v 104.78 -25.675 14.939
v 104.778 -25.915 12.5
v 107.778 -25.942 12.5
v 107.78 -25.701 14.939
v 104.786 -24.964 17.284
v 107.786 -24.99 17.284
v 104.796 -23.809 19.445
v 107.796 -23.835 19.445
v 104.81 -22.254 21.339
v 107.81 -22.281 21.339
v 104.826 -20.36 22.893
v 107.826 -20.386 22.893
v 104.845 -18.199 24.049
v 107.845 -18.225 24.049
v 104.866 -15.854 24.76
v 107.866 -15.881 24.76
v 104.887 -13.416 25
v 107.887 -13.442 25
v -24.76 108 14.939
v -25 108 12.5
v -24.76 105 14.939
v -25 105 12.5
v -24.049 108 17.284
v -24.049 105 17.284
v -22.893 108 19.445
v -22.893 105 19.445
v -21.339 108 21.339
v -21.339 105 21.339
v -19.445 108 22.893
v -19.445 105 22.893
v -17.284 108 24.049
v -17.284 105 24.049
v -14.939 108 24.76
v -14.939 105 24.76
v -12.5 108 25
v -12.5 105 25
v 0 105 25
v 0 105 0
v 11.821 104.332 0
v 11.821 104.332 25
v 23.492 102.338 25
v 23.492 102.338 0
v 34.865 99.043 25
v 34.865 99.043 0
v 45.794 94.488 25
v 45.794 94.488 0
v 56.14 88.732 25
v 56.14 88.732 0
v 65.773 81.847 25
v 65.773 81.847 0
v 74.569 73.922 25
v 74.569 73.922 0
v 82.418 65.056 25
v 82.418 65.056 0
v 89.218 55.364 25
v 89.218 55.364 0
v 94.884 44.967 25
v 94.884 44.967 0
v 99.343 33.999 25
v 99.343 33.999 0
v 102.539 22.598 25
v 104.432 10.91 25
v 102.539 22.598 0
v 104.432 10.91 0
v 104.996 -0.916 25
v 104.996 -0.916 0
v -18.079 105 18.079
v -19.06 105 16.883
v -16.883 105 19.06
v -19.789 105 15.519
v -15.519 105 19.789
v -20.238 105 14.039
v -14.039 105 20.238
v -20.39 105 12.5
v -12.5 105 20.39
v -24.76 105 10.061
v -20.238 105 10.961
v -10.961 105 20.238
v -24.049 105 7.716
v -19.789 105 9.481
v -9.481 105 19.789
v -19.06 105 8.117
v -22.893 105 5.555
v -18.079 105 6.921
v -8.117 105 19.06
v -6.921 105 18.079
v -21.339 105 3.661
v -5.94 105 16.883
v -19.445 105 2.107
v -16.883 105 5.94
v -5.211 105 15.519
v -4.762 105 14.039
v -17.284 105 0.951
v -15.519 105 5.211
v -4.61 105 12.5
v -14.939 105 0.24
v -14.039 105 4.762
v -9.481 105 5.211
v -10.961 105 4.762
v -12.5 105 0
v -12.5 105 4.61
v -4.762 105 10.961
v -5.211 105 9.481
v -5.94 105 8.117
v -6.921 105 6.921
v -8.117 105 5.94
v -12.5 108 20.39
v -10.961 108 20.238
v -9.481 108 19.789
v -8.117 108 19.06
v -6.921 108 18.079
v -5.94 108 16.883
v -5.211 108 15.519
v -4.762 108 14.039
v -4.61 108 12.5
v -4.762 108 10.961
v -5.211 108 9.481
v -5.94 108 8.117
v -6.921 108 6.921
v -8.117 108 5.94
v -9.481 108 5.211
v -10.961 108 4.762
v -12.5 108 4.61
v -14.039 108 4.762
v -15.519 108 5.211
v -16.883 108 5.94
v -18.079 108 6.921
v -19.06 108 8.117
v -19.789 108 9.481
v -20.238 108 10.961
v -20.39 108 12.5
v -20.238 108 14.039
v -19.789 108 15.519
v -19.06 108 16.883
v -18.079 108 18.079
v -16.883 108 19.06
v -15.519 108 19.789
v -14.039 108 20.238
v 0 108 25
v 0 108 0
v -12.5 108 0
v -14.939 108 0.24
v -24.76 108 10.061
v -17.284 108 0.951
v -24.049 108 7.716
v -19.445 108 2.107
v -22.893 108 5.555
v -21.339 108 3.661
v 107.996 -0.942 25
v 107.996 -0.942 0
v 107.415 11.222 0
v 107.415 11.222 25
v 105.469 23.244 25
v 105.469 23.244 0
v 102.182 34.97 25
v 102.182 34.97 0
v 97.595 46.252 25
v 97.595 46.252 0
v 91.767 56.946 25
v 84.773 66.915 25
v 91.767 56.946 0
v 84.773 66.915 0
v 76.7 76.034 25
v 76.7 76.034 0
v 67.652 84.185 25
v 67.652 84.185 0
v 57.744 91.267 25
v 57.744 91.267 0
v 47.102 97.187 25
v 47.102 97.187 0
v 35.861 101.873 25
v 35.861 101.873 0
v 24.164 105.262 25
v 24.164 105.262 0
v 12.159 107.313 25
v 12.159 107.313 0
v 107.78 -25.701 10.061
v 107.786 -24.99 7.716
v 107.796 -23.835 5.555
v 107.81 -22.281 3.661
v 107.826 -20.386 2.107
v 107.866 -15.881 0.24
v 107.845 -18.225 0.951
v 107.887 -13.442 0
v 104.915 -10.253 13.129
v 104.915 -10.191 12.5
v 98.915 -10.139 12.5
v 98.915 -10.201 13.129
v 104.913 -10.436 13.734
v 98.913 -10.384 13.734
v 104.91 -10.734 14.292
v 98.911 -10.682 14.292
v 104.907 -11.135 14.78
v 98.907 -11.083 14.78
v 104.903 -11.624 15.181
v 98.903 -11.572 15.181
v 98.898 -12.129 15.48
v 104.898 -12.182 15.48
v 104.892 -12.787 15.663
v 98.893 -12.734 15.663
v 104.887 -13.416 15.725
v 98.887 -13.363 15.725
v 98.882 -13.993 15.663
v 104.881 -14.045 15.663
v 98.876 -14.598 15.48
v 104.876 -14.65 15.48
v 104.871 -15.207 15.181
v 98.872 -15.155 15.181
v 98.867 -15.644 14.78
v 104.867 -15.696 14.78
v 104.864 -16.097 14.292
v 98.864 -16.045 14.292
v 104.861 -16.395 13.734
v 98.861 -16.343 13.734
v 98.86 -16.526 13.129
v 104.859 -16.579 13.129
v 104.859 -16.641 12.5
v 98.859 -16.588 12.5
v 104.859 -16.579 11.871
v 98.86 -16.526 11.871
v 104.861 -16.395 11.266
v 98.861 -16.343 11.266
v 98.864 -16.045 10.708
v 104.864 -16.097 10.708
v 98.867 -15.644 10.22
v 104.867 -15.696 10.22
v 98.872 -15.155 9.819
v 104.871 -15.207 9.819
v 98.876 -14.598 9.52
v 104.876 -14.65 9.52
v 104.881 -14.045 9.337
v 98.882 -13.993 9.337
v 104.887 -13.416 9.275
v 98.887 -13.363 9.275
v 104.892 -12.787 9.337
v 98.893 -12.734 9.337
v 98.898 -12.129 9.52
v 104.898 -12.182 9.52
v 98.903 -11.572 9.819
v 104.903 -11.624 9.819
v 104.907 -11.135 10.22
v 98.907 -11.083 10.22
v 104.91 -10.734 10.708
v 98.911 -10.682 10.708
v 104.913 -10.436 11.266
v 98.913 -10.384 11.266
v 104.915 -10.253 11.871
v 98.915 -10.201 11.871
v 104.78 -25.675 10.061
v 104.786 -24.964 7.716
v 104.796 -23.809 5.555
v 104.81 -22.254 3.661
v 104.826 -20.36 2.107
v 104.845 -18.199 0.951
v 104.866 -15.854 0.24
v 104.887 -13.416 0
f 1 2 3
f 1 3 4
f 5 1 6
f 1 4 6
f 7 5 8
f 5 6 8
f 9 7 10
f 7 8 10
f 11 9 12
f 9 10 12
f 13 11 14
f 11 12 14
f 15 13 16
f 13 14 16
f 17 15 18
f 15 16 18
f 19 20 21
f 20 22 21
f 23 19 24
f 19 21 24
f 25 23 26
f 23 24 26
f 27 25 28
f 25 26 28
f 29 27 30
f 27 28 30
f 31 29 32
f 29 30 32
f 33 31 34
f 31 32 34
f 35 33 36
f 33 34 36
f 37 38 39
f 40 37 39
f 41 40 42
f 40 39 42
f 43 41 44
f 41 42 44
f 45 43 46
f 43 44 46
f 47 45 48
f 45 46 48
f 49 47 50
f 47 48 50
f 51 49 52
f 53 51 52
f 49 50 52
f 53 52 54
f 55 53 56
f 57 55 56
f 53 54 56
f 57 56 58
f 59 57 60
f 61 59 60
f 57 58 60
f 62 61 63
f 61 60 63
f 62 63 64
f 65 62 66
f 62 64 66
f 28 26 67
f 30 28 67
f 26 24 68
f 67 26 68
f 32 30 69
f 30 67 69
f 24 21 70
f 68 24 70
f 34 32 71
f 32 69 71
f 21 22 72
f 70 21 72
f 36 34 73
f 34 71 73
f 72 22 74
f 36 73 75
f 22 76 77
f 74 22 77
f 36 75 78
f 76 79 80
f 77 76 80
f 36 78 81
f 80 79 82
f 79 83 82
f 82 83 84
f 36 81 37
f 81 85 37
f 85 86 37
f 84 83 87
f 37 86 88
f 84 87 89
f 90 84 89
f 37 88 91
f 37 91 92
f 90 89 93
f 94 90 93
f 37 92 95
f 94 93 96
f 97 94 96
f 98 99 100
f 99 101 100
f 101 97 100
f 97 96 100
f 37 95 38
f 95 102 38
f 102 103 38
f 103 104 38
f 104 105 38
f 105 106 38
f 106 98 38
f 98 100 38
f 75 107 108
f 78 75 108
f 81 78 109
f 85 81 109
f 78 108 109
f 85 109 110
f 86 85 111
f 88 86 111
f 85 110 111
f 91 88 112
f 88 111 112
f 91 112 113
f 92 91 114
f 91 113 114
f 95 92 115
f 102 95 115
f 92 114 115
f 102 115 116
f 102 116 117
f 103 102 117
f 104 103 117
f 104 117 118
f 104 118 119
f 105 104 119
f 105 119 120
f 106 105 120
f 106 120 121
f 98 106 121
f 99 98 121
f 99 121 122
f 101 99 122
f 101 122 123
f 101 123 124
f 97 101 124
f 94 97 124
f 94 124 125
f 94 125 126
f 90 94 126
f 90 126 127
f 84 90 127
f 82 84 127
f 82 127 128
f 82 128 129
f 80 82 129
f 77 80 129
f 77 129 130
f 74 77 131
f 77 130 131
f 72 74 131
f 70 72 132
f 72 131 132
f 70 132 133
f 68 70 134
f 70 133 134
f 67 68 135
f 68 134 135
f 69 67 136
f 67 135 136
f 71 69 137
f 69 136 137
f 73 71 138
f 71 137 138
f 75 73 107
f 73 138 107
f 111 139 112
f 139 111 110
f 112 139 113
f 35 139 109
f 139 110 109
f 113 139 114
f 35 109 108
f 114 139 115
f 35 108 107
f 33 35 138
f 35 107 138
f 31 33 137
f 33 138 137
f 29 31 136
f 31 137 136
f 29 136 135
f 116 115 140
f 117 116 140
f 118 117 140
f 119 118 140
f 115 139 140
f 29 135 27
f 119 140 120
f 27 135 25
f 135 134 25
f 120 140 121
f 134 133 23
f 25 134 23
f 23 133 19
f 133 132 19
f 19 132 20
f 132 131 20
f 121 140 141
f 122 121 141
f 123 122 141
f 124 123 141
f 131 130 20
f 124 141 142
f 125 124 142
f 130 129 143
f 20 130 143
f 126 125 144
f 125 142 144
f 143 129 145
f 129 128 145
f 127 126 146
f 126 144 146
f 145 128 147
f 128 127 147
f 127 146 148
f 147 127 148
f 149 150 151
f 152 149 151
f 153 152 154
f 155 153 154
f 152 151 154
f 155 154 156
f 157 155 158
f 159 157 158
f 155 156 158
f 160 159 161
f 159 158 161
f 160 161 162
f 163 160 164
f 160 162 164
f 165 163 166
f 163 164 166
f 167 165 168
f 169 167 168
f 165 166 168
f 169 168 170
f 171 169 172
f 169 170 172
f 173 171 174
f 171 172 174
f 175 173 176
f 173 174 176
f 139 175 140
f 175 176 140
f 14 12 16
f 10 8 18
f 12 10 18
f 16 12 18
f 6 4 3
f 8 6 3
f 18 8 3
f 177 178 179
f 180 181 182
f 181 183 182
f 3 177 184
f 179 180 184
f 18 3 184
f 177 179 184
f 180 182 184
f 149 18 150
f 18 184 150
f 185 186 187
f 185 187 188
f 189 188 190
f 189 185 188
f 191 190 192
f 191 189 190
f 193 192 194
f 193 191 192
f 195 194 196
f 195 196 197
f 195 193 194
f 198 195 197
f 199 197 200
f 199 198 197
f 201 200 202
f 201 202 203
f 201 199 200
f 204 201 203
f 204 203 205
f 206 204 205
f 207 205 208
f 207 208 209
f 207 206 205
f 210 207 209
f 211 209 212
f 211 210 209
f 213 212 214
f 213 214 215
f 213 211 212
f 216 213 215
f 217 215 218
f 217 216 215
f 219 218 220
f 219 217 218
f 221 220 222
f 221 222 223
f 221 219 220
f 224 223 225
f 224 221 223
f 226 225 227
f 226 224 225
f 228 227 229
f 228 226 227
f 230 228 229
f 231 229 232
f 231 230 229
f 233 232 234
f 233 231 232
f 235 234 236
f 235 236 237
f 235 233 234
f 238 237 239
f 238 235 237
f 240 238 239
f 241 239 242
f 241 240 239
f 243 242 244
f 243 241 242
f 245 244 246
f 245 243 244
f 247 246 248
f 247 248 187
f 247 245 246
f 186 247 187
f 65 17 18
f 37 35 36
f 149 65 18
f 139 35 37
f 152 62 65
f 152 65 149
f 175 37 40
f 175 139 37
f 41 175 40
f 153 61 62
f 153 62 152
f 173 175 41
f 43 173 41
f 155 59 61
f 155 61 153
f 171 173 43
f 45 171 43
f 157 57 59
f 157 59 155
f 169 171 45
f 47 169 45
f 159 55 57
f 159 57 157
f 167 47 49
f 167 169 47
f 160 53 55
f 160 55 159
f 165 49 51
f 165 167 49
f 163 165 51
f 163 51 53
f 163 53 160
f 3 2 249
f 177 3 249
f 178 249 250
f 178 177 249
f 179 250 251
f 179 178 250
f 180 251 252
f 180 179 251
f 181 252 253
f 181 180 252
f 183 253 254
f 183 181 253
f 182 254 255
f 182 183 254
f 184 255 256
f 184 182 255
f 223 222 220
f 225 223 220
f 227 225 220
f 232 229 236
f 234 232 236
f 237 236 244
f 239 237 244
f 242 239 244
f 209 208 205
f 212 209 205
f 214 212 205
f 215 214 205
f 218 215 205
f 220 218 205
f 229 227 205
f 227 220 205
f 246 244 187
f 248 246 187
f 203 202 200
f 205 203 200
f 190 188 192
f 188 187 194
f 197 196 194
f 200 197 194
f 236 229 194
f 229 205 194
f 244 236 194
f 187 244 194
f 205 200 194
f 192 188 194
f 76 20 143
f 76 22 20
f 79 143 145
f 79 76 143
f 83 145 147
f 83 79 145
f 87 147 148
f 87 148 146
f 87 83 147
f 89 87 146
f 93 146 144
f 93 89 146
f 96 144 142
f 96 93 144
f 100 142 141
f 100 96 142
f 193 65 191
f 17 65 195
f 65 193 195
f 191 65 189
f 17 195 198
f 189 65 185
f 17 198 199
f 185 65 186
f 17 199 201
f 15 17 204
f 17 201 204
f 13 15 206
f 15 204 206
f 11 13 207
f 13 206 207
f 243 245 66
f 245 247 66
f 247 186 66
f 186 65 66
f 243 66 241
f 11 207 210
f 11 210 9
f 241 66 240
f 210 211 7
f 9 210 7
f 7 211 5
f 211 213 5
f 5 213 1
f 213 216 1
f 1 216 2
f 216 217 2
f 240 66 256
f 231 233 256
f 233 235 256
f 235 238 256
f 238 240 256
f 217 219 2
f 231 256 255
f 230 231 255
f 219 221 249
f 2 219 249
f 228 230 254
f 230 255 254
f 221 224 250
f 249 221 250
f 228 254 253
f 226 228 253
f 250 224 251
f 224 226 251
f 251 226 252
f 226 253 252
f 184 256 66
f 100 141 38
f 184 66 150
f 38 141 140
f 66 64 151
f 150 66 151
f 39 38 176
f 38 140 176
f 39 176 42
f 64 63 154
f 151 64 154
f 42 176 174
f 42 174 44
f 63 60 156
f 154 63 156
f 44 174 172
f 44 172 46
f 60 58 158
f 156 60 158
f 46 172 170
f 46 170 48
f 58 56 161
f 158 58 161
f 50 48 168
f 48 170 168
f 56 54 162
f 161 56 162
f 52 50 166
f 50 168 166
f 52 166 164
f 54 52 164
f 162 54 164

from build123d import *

# Parameters (mm, degrees)
BOSS_EXTRUDE1_DEPTH = 25
FILLET1_R           = 12.5
CUT_EXTRUDE1_REACH  = 175.866
SKETCH3_R           = 7.89
SKETCH4_R           = 3.225
BOSS_EXTRUDE2_DEPTH = 6


with BuildPart() as part:
    # Sketch2 → Boss-Extrude1 (new body)
    with BuildSketch(Plane.XY):
        with BuildLine():
            Line((0, 108), (-25, 108))
            Line((-25, 108), (-25, 105))
            Line((-25, 105), (0, 105))
            ThreePointArc((0, 105), (74.56946444, 73.921546068), (104.996001922, -0.916286227))
            Line((104.996001922, -0.916286227), (104.777838534, -25.915334304))
            Line((104.777838534, -25.915334304), (107.777724303, -25.94151391))
            Line((107.777724303, -25.94151391), (107.995887691, -0.942465834))
            ThreePointArc((107.995887691, -0.942465834), (76.700020567, 76.033590241), (0, 108))
        make_face()
    extrude(amount=BOSS_EXTRUDE1_DEPTH)

    # Fillet1
    fillet1_edges = [part.edges().sort_by_distance(p)[0] for p in [
        (106.277781419, -25.928424107, 0),
        (106.277781419, -25.928424107, 25),
        (-25, 106.5, 25),
        (-25, 106.5, 0),
    ]]
    fillet(fillet1_edges, radius=FILLET1_R - 0.0001)  # a hair under: the kernel refuses the full size

    # Sketch3 → Cut-Extrude1 (cut, up to next)
    with BuildSketch(Plane(origin=(0, 108, 0), x_dir=(1, 0, 0), z_dir=(0, 1, 0)), mode=Mode.PRIVATE) as cut_extrude1_sk1:
        with Locations(Location((-12.5, -12.5, 0), (0, 0, 270))):
            Circle(SKETCH3_R)
    cut_extrude1_tool1 = extrude(cut_extrude1_sk1.sketch, amount=-CUT_EXTRUDE1_REACH, mode=Mode.PRIVATE) & part.part
    add(cut_extrude1_tool1.solids().sort_by_distance((-12.5, 108, 12.5))[0], mode=Mode.SUBTRACT)

    # Sketch4 → Boss-Extrude2 (add)
    with BuildSketch(Plane(origin=(104.996001922, -0.916286227, 0), x_dir=(0, 0, -1), z_dir=(0.9999619230641714, -0.008726535498378436, 0))):
        with Locations(Location((-12.5, -12.5, 0), (0, 0, 90))):
            Circle(SKETCH4_R)
    extrude(amount=-BOSS_EXTRUDE2_DEPTH)


solid = part.part
